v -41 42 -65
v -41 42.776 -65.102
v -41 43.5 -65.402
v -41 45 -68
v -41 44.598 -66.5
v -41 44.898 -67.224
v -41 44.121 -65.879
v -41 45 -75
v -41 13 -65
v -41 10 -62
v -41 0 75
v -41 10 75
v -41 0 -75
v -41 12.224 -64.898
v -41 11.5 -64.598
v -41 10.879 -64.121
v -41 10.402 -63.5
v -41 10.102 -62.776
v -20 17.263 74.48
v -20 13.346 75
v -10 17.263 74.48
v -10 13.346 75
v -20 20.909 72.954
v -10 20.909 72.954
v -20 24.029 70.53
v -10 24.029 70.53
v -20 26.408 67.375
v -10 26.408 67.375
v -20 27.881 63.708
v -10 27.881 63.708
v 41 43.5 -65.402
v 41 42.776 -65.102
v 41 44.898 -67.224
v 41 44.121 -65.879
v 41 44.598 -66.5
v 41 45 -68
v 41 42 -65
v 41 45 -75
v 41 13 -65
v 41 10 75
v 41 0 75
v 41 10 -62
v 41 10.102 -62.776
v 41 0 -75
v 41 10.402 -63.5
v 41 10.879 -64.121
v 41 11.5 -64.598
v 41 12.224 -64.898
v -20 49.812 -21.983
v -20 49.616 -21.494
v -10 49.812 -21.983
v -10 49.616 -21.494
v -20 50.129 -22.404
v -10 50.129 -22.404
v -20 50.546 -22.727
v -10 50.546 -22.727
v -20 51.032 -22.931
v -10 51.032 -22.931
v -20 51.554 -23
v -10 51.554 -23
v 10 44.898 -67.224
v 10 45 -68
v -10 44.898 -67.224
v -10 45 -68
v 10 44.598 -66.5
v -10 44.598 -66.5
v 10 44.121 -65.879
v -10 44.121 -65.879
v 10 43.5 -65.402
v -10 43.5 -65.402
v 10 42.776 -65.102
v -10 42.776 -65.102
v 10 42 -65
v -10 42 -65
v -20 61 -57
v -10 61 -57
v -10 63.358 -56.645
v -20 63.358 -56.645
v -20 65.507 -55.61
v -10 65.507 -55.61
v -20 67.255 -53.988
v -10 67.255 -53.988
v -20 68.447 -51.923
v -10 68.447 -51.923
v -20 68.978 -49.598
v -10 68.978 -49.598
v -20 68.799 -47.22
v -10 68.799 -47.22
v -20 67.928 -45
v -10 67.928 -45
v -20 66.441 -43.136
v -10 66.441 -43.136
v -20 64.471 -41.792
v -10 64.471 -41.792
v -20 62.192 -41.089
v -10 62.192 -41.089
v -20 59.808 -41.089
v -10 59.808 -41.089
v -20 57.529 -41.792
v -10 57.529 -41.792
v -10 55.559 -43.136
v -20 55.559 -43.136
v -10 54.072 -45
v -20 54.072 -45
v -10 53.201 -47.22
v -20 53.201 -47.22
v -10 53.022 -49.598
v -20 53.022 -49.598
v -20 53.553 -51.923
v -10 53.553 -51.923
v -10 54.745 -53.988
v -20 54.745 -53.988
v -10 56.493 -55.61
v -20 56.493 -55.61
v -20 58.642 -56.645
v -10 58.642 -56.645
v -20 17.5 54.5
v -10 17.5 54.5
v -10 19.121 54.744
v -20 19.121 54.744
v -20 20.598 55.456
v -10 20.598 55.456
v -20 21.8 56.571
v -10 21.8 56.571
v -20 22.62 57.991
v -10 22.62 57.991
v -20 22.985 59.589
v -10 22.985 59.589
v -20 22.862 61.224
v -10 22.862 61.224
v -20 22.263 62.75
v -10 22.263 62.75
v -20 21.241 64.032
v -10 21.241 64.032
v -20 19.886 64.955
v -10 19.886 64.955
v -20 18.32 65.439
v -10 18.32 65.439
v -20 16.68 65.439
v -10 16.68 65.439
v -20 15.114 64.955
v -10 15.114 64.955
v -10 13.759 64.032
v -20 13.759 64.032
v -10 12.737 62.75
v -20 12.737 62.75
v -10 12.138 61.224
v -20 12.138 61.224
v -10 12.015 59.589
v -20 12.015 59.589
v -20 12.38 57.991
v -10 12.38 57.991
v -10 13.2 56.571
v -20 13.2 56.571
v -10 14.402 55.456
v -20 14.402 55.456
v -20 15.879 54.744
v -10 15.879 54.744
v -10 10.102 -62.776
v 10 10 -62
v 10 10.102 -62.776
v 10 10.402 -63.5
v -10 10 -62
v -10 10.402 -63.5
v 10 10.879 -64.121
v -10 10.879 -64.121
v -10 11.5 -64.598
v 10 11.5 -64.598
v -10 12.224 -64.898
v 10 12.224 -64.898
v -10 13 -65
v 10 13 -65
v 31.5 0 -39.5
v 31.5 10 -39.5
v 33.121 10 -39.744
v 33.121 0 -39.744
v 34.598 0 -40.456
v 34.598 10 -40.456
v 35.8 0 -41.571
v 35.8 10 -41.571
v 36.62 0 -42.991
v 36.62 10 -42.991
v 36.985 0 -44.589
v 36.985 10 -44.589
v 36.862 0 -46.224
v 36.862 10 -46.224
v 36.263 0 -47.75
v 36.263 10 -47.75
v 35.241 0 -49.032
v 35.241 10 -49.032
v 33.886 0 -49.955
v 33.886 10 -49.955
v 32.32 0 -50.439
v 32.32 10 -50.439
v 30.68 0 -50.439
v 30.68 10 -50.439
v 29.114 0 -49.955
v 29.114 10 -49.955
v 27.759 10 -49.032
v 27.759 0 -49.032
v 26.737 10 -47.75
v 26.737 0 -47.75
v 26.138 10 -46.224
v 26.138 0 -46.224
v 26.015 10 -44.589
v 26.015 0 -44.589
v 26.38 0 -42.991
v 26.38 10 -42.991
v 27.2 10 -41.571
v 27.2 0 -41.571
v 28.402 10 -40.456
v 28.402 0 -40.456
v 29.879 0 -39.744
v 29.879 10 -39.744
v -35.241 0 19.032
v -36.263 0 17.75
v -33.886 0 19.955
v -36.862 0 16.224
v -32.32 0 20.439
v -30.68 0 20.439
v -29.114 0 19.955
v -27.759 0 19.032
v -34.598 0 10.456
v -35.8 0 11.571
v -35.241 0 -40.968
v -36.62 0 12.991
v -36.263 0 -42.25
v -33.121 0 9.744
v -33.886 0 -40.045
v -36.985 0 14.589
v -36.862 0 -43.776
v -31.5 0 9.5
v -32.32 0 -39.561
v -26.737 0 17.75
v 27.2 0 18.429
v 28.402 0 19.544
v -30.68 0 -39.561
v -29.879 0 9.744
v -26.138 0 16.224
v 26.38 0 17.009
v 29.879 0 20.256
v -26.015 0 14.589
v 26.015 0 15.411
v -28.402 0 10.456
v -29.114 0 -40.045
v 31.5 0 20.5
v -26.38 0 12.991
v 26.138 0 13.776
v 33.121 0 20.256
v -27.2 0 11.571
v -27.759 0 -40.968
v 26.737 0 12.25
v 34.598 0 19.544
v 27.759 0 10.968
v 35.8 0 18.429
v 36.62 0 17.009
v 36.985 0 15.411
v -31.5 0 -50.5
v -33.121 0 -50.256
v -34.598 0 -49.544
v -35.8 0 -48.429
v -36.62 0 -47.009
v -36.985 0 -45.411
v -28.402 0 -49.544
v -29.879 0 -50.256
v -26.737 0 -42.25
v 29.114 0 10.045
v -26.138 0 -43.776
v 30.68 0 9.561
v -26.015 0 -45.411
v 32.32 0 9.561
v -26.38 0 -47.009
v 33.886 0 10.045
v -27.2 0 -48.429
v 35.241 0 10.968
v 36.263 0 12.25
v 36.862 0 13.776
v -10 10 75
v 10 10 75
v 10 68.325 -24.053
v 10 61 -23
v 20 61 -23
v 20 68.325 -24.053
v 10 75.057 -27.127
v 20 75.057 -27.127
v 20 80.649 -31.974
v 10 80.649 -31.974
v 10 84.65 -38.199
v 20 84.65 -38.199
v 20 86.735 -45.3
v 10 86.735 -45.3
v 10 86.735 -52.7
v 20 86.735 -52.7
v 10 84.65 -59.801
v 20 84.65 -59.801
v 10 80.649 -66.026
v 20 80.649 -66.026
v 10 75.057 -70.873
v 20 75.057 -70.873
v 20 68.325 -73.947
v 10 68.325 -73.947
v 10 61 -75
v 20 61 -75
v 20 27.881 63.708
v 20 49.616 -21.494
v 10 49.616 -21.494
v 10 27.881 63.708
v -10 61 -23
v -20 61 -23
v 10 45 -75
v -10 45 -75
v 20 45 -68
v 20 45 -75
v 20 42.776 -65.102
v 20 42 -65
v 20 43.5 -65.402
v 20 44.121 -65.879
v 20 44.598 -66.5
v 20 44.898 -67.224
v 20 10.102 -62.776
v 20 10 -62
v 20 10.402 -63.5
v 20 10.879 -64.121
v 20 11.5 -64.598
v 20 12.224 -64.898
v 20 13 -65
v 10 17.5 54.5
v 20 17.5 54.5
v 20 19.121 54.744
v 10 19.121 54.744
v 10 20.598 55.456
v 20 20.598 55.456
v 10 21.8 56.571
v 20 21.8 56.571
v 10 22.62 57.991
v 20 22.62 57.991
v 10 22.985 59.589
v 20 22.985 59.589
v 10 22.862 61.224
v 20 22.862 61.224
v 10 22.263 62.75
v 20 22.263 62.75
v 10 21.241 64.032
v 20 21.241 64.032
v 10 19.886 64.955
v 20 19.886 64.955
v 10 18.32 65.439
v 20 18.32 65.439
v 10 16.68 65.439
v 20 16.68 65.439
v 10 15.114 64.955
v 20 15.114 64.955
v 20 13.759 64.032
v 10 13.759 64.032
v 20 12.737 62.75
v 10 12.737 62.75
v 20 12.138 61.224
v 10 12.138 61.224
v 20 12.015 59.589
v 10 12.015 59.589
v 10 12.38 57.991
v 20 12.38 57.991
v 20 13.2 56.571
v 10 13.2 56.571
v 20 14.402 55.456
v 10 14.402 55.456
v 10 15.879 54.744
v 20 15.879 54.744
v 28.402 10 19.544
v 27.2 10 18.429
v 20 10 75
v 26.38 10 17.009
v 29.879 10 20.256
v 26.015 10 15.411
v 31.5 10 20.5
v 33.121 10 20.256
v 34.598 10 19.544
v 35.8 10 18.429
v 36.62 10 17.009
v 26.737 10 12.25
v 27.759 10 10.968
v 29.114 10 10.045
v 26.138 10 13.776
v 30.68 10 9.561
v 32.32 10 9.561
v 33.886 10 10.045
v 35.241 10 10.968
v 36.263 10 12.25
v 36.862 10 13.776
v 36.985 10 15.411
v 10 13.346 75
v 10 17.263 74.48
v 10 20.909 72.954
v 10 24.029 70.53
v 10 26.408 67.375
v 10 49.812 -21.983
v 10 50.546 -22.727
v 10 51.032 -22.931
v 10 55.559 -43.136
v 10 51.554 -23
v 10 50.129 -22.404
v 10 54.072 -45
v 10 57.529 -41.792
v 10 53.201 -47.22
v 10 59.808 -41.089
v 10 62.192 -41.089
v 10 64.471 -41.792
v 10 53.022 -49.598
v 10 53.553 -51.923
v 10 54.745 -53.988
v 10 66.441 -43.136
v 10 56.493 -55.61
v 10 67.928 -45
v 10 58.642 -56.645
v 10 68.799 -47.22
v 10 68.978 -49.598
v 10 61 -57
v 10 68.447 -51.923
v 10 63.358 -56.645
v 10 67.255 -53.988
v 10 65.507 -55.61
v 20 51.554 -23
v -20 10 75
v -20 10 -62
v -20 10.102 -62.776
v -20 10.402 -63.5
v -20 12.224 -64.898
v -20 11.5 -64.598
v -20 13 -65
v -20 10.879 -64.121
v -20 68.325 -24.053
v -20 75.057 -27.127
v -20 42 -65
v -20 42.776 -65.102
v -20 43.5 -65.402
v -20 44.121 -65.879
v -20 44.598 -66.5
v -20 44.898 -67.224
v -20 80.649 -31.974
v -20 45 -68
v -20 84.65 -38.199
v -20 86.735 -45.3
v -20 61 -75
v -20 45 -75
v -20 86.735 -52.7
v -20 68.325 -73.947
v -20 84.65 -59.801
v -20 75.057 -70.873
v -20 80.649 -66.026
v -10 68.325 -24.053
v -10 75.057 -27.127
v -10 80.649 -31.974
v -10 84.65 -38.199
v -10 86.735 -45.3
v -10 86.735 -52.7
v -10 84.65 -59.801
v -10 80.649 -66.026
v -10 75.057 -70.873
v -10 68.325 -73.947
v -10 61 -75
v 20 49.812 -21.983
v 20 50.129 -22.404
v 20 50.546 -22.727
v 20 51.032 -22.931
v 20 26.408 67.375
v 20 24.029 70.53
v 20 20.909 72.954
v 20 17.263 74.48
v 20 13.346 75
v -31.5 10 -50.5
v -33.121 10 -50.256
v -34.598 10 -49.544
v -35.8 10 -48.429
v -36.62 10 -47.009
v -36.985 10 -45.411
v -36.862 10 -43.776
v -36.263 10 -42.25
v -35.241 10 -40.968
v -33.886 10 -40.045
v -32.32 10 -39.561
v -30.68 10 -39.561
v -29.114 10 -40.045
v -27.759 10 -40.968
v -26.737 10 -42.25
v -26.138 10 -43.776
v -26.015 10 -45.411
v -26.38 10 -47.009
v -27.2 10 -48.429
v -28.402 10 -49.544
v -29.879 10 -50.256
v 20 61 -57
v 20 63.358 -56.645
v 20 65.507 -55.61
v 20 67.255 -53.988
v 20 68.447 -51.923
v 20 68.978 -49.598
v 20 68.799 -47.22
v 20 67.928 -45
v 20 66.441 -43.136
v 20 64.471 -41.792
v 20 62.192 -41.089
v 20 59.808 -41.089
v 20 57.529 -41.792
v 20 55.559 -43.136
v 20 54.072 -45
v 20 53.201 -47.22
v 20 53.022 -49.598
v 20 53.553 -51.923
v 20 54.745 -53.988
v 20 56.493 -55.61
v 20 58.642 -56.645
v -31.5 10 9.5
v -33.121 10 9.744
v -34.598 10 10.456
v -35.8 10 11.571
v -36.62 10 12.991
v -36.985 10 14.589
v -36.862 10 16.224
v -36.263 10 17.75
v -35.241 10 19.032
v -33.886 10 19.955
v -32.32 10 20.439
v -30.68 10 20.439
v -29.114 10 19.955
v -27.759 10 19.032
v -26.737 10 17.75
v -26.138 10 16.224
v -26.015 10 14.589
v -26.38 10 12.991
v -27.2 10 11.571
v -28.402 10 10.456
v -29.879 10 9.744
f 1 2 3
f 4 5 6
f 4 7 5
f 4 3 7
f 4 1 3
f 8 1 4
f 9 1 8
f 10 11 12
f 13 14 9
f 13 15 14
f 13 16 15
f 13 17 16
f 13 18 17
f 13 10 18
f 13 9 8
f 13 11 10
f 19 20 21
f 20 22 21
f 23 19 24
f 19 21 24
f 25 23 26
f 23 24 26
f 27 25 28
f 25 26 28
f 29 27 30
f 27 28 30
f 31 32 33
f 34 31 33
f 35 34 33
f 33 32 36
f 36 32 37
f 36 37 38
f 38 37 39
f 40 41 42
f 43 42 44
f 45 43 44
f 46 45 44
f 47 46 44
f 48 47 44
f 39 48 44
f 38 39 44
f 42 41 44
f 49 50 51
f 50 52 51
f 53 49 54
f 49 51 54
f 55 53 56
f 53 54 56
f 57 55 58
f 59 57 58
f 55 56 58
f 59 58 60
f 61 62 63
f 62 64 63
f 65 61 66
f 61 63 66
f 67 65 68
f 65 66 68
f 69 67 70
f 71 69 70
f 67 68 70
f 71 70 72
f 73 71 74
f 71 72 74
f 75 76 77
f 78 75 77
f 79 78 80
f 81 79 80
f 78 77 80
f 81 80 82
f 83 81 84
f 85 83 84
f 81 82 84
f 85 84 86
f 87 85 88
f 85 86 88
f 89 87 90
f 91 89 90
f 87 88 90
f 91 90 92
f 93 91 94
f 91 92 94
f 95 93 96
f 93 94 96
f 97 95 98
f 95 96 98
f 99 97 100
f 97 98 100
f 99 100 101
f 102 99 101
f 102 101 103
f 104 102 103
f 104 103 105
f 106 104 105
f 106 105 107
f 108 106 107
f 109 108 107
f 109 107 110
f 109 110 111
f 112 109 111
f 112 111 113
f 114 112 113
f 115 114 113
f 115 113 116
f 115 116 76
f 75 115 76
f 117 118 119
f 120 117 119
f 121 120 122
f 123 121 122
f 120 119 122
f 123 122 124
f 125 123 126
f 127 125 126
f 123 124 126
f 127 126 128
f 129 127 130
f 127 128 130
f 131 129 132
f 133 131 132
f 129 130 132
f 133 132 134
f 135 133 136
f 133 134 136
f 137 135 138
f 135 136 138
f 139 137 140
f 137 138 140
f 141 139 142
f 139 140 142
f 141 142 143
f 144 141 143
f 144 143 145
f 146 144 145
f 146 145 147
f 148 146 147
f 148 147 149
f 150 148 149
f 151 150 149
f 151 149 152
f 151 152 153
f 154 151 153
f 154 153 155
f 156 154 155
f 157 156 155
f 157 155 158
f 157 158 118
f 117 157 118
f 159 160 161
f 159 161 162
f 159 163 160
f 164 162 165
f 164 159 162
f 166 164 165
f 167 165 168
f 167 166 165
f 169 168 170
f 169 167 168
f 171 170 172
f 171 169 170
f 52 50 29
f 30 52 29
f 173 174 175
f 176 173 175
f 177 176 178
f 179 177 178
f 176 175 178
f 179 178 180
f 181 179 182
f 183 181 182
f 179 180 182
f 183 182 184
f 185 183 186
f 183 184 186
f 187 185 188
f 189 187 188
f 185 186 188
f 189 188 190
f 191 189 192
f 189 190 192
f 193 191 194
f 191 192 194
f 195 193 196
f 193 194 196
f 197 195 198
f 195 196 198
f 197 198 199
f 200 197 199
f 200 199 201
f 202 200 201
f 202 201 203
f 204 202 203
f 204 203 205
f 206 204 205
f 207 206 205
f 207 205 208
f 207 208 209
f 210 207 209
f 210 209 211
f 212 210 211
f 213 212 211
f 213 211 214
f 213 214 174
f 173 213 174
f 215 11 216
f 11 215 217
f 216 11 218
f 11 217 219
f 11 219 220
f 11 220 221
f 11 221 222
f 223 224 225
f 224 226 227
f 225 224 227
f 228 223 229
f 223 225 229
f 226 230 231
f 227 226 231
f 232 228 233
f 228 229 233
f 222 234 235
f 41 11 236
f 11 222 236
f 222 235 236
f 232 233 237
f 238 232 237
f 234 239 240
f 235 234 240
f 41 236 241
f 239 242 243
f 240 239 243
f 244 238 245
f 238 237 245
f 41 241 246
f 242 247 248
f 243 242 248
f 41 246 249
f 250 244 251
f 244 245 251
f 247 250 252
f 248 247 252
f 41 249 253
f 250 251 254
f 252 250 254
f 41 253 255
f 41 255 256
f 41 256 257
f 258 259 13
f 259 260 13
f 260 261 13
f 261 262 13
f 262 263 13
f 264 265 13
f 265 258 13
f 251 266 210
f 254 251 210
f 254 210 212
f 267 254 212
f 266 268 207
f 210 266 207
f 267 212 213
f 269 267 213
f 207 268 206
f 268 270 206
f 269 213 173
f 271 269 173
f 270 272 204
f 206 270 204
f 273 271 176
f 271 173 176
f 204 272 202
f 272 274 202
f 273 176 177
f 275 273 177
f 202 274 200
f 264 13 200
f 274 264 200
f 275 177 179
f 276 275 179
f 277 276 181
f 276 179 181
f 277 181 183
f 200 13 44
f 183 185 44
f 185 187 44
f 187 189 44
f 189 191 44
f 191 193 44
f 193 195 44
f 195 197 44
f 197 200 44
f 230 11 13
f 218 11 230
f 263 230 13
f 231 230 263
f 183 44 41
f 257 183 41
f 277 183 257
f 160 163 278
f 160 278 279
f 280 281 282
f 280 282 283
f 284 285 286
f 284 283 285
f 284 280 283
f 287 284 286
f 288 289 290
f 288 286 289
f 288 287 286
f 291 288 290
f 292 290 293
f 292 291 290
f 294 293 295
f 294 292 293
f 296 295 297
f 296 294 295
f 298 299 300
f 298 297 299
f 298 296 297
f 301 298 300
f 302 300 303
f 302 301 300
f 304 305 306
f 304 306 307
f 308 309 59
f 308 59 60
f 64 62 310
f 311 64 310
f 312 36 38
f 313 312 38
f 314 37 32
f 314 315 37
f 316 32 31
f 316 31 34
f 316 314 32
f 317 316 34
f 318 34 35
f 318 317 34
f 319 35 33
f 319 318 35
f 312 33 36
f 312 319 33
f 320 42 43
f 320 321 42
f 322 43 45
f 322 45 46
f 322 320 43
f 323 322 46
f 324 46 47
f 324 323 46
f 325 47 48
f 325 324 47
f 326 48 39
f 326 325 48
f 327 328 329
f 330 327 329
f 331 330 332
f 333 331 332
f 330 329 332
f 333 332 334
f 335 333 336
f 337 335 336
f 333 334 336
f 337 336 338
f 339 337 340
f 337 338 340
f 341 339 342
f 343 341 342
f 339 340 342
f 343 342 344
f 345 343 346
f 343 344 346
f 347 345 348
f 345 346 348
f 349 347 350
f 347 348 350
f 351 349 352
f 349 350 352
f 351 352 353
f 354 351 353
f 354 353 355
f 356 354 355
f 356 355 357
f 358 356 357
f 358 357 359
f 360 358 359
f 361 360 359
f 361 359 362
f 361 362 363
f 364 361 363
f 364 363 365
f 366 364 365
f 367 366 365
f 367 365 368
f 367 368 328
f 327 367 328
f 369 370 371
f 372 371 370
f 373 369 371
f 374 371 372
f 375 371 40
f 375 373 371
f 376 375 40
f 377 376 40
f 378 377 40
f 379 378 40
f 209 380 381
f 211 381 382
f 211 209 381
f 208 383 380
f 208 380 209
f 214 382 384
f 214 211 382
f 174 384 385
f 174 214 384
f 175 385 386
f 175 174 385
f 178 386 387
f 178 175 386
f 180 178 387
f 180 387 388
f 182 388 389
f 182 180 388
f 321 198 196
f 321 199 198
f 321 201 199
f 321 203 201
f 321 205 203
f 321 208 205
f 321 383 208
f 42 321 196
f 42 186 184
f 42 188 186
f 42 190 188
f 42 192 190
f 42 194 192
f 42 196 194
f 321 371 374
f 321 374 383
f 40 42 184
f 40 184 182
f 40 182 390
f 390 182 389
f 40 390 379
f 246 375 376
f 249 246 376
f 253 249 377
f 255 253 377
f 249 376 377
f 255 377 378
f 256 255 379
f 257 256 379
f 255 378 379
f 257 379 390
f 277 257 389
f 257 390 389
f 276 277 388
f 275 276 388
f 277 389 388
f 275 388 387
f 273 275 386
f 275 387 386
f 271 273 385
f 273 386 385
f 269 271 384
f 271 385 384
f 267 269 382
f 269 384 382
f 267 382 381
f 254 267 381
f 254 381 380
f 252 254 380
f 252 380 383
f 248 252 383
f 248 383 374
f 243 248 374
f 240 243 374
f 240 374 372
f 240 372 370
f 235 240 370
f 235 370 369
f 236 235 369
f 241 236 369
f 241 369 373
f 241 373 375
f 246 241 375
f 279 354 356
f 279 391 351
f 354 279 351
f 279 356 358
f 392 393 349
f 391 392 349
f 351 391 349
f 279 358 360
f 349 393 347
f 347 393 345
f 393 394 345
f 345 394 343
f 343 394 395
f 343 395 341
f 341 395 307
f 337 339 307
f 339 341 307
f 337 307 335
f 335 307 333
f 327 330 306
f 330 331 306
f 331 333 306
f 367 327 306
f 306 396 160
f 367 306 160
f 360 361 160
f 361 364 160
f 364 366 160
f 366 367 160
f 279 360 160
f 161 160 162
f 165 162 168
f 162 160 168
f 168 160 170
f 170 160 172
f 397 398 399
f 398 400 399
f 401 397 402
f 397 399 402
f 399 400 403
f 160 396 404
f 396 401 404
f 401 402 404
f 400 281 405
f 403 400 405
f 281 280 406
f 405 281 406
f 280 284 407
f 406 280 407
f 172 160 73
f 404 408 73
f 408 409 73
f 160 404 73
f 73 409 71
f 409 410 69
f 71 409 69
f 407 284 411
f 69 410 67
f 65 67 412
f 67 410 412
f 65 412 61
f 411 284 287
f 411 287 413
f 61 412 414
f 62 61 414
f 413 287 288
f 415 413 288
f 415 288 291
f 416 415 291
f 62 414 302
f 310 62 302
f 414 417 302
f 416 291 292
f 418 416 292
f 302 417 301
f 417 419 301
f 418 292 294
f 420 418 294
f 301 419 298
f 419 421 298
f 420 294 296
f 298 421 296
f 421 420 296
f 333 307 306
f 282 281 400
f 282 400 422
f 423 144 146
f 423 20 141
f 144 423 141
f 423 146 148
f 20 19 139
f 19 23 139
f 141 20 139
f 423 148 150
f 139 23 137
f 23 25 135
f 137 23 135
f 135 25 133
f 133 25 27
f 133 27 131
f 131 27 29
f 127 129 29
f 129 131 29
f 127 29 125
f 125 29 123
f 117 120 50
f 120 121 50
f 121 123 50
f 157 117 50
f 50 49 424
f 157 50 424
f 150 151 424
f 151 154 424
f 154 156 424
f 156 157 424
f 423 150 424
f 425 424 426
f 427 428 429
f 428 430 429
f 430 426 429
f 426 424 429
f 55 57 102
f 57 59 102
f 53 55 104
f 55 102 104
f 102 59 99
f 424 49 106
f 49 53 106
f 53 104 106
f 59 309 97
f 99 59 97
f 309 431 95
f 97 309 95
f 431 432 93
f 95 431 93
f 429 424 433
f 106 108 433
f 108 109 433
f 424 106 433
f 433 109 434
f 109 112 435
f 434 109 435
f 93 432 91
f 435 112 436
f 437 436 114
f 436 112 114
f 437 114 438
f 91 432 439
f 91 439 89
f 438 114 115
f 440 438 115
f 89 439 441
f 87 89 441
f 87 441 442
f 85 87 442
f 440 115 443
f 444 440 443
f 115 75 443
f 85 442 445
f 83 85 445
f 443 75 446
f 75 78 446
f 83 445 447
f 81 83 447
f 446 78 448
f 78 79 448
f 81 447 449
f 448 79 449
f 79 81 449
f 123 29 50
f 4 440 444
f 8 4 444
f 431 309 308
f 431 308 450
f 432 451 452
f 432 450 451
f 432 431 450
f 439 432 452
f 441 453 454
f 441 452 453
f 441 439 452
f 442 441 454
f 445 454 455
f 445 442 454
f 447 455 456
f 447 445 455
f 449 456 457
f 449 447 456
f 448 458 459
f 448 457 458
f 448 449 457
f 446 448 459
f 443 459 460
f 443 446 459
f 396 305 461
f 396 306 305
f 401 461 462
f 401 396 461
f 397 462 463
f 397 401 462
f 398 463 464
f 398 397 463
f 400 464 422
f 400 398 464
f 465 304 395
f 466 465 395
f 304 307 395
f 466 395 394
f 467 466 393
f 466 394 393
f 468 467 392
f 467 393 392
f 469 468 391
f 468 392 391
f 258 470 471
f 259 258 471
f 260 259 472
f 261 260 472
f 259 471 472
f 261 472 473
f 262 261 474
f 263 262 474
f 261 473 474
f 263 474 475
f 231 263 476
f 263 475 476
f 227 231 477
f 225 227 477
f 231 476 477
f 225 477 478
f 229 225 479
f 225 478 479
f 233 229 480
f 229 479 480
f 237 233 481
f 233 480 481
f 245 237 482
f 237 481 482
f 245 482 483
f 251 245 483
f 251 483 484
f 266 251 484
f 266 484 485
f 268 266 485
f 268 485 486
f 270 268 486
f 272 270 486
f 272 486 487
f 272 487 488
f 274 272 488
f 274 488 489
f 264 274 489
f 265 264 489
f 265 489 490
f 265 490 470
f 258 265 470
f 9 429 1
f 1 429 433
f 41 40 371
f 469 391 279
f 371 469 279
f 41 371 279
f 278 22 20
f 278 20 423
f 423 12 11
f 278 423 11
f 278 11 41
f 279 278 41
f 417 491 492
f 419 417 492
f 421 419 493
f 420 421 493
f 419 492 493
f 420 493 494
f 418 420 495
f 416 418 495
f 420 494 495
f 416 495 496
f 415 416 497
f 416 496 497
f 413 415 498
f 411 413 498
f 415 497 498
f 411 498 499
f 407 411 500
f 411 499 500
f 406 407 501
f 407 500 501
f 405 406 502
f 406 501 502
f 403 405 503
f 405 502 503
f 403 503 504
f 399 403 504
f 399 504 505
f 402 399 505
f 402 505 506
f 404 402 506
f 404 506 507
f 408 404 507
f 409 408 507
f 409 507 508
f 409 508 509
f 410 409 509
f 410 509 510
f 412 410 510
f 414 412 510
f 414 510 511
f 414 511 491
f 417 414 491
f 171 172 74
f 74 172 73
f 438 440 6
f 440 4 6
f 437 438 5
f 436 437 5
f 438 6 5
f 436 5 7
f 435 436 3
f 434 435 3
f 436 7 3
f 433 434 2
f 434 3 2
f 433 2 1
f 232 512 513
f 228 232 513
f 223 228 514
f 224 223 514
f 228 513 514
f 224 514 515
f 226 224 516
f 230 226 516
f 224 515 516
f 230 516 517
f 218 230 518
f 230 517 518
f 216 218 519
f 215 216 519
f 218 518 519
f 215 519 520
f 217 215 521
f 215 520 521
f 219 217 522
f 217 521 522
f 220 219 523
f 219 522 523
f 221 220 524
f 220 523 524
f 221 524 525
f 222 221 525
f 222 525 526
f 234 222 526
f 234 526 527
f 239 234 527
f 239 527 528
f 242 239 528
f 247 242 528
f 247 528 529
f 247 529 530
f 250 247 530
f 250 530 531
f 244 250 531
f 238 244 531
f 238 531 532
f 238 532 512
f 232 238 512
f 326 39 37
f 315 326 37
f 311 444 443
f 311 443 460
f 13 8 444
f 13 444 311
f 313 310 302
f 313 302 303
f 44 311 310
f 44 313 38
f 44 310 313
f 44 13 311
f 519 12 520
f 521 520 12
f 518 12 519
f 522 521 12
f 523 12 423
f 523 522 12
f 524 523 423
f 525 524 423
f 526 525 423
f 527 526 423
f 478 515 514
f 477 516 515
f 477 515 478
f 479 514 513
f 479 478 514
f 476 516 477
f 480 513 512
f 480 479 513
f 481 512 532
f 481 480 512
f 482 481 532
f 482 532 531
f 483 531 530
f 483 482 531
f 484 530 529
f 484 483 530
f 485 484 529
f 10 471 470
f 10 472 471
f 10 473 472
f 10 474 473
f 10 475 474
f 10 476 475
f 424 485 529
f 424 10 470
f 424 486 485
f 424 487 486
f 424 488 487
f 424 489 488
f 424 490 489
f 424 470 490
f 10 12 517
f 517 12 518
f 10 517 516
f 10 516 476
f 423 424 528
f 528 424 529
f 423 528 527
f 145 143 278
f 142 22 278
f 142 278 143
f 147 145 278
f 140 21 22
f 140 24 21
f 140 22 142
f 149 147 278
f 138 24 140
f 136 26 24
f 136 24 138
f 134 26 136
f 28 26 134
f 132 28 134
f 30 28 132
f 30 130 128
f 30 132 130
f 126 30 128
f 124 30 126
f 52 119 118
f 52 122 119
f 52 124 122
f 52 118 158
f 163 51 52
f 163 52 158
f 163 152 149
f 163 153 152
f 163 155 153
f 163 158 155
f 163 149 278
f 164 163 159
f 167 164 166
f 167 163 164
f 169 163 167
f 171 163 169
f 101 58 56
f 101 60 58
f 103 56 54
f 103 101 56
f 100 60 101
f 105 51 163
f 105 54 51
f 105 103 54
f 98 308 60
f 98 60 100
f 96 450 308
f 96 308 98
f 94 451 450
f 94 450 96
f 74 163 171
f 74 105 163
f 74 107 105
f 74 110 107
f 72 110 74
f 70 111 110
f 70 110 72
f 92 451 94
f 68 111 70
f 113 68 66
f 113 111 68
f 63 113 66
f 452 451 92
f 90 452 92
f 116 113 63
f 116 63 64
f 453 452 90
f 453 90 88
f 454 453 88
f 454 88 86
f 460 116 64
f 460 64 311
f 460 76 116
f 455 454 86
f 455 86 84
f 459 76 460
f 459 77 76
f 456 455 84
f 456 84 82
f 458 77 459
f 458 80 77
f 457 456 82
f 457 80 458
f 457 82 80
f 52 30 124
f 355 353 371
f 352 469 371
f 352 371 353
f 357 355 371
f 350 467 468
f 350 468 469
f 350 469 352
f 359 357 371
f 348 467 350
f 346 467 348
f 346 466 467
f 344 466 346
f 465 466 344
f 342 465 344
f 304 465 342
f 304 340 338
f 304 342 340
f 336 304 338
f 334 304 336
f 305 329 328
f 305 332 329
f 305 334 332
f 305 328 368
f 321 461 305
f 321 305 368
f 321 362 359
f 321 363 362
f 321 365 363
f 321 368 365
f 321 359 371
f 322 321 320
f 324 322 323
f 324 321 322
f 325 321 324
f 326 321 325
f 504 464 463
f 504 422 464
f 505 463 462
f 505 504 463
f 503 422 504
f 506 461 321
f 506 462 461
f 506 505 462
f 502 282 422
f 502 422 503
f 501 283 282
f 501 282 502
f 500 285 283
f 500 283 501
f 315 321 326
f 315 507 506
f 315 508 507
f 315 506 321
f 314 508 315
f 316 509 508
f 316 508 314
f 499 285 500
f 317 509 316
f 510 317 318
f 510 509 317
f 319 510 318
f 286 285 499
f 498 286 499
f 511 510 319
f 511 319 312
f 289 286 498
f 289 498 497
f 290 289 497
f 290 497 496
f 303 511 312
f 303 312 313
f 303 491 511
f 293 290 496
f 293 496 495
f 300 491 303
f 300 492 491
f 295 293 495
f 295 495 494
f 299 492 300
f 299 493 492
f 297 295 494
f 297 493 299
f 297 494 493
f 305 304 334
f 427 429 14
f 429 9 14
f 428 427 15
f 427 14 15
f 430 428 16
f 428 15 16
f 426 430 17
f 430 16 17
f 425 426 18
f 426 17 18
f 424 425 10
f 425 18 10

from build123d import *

# Parameters (mm, degrees)
SKETCH1_W                = 82
SKETCH1_H                = 150
BOSS_EXTRUDE1_DEPTH      = 10
SKETCH2_W                = 10
SKETCH2_H                = 45
BOSS_EXTRUDE2_DEPTH      = 82
BOSS_EXTRUDE3_DEPTH      = 42
BOSS_EXTRUDE3_DEPTH_BACK = 10
FILLET3_RADIUS           = 26
FILLET3_LENGTH           = 10
FILLET4_RADIUS           = 26
FILLET4_LENGTH           = 10
BOSS_EXTRUDE4_DEPTH      = 10
BOSS_EXTRUDE5_DEPTH      = 10
FILLET5_R                = 15
FILLET6_R                = 15
SKETCH6_R                = 8
SKETCH6_R_2              = 5.5
CUT_EXTRUDE1_DEPTH       = 131.057679512
FILLET7_R                = 3
FILLET8_R                = 3
FILLET9_R                = 3
FILLET10_R               = 3
FILLET11_R               = 2
SKETCH7_R                = 5.5
CUT_EXTRUDE2_DEPTH       = 116.043470045


with BuildPart() as part:
    # Sketch1 → Boss-Extrude1 (new body)
    with BuildSketch(Plane(origin=(0, 0, 0), x_dir=(1, 0, 0), z_dir=(0, 1, 0))):
        Rectangle(SKETCH1_W, SKETCH1_H)
    extrude(amount=BOSS_EXTRUDE1_DEPTH)

    # Sketch2 → Boss-Extrude2 (add, through all)
    with BuildSketch(Plane(origin=(41, 0, 0), x_dir=(0, 0, -1), z_dir=(1, 0, 0))):
        with Locations((70, 22.5)):
            Rectangle(SKETCH2_W, SKETCH2_H)
    extrude(amount=-BOSS_EXTRUDE2_DEPTH)

    # Sketch3 → Boss-Extrude3 (add, two sides: drawn at the far end of the back side and taken through both)
    with BuildSketch(Plane.XY.offset(-65).offset(-BOSS_EXTRUDE3_DEPTH_BACK)):
        Polygon((10, 45), (10, 10), (20, 10), (20, 45), (20, 87), (10, 87), align=None)
        Polygon((-10, 45), (-10, 87), (-20, 87), (-20, 45), (-20, 10), (-10, 10), align=None)
    extrude(amount=BOSS_EXTRUDE3_DEPTH + BOSS_EXTRUDE3_DEPTH_BACK)

    # Fillet3: full round fillet: the end face becomes a half cylinder, R = half its width
    fillet3_face = Plane((15, 87, -49), x_dir=(-1, 0, 0), z_dir=(0, 1, 0))  # on the end face: x along it, z out of the body
    fillet3_slab = fillet3_face.offset(-FILLET3_RADIUS / 2) * Box(FILLET3_LENGTH, 2 * FILLET3_RADIUS, FILLET3_RADIUS, mode=Mode.PRIVATE)  # the body's end, R deep
    fillet3_round = Plane((15, 61, -49), x_dir=(0, 1, 0), z_dir=(-1, 0, 0)) * Cylinder(FILLET3_RADIUS, FILLET3_LENGTH, mode=Mode.PRIVATE)  # its axis R under the face
    add(fillet3_slab - fillet3_round, mode=Mode.SUBTRACT)

    # Fillet4: full round fillet: the end face becomes a half cylinder, R = half its width
    fillet4_face = Plane((-15, 87, -49), x_dir=(-1, 0, 0), z_dir=(0, 1, 0))  # on the end face: x along it, z out of the body
    fillet4_slab = fillet4_face.offset(-FILLET4_RADIUS / 2) * Box(FILLET4_LENGTH, 2 * FILLET4_RADIUS, FILLET4_RADIUS, mode=Mode.PRIVATE)  # the body's end, R deep
    fillet4_round = Plane((-15, 61, -49), x_dir=(0, 1, 0), z_dir=(-1, 0, 0)) * Cylinder(FILLET4_RADIUS, FILLET4_LENGTH, mode=Mode.PRIVATE)  # its axis R under the face
    add(fillet4_slab - fillet4_round, mode=Mode.SUBTRACT)

    # Sketch4 → Boss-Extrude4 (add)
    with BuildSketch(Plane(origin=(20, 0, 0), x_dir=(0, 0, -1), z_dir=(1, 0, 0))):
        Polygon((23, 10), (23, 50), (-75, 25), (-75, 10), align=None)
    extrude(amount=-BOSS_EXTRUDE4_DEPTH)

    # Sketch5 → Boss-Extrude5 (add)
    with BuildSketch(Plane.ZY.offset(20)):
        Polygon((-23, 50), (75, 25), (75, 10), (-23, 10), align=None)
    extrude(amount=-BOSS_EXTRUDE5_DEPTH)

    # Fillet5
    fillet5_edges = [part.edges().sort_by_distance(p)[0] for p in [
        (15, 25, 75),
    ]]
    fillet(fillet5_edges, radius=FILLET5_R)

    # Fillet6
    fillet6_edges = [part.edges().sort_by_distance(p)[0] for p in [
        (-15, 25, 75),
    ]]
    fillet(fillet6_edges, radius=FILLET6_R)

    # Sketch6 → Cut-Extrude1 (cut, through all)
    with BuildSketch(Plane(origin=(20, 0, 0), x_dir=(0, 0, -1), z_dir=(1, 0, 0))):
        with Locations((49, 61)):
            Circle(SKETCH6_R)
        with Locations((-60, 17.5)):
            Circle(SKETCH6_R_2)
    extrude(amount=-CUT_EXTRUDE1_DEPTH, mode=Mode.SUBTRACT)

    # Fillet7
    fillet7_edges = [part.edges().sort_by_distance(p)[0] for p in [
        (30.5, 45, -65),
    ]]
    fillet(fillet7_edges, radius=FILLET7_R)

    # Fillet8
    fillet8_edges = [part.edges().sort_by_distance(p)[0] for p in [
        (0, 45, -65),
    ]]
    fillet(fillet8_edges, radius=FILLET8_R)

    # Fillet9
    fillet9_edges = [part.edges().sort_by_distance(p)[0] for p in [
        (-30.5, 45, -65),
    ]]
    fillet(fillet9_edges, radius=FILLET9_R)

    # Fillet10
    fillet10_edges = [part.edges().sort_by_distance(p)[0] for p in [
        (30.5, 10, -65),
        (0, 10, -65),
        (-30.5, 10, -65),
    ]]
    fillet(fillet10_edges, radius=FILLET10_R)

    # Fillet11
    fillet11_edges = [part.edges().sort_by_distance(p)[0] for p in [
        (15, 50, -23),
        (-15, 50, -23),
    ]]
    fillet(fillet11_edges, radius=FILLET11_R)

    # Sketch7 → Cut-Extrude2 (cut, through all)
    with BuildSketch(Plane(origin=(0, 10, 0), x_dir=(1, 0, 0), z_dir=(0, 1, 0))):
        with Locations(Location((31.5, 45, 0), (0, 0, 270))):
            Circle(SKETCH7_R)
        with Locations(Location((31.5, -15, 0), (0, 0, 270))):
            Circle(SKETCH7_R)
        with Locations(Location((-31.5, -15, 0), (0, 0, 90))):
            Circle(SKETCH7_R)
        with Locations(Location((-31.5, 45, 0), (0, 0, 90))):
            Circle(SKETCH7_R)
    extrude(amount=-CUT_EXTRUDE2_DEPTH, mode=Mode.SUBTRACT)


solid = part.part
